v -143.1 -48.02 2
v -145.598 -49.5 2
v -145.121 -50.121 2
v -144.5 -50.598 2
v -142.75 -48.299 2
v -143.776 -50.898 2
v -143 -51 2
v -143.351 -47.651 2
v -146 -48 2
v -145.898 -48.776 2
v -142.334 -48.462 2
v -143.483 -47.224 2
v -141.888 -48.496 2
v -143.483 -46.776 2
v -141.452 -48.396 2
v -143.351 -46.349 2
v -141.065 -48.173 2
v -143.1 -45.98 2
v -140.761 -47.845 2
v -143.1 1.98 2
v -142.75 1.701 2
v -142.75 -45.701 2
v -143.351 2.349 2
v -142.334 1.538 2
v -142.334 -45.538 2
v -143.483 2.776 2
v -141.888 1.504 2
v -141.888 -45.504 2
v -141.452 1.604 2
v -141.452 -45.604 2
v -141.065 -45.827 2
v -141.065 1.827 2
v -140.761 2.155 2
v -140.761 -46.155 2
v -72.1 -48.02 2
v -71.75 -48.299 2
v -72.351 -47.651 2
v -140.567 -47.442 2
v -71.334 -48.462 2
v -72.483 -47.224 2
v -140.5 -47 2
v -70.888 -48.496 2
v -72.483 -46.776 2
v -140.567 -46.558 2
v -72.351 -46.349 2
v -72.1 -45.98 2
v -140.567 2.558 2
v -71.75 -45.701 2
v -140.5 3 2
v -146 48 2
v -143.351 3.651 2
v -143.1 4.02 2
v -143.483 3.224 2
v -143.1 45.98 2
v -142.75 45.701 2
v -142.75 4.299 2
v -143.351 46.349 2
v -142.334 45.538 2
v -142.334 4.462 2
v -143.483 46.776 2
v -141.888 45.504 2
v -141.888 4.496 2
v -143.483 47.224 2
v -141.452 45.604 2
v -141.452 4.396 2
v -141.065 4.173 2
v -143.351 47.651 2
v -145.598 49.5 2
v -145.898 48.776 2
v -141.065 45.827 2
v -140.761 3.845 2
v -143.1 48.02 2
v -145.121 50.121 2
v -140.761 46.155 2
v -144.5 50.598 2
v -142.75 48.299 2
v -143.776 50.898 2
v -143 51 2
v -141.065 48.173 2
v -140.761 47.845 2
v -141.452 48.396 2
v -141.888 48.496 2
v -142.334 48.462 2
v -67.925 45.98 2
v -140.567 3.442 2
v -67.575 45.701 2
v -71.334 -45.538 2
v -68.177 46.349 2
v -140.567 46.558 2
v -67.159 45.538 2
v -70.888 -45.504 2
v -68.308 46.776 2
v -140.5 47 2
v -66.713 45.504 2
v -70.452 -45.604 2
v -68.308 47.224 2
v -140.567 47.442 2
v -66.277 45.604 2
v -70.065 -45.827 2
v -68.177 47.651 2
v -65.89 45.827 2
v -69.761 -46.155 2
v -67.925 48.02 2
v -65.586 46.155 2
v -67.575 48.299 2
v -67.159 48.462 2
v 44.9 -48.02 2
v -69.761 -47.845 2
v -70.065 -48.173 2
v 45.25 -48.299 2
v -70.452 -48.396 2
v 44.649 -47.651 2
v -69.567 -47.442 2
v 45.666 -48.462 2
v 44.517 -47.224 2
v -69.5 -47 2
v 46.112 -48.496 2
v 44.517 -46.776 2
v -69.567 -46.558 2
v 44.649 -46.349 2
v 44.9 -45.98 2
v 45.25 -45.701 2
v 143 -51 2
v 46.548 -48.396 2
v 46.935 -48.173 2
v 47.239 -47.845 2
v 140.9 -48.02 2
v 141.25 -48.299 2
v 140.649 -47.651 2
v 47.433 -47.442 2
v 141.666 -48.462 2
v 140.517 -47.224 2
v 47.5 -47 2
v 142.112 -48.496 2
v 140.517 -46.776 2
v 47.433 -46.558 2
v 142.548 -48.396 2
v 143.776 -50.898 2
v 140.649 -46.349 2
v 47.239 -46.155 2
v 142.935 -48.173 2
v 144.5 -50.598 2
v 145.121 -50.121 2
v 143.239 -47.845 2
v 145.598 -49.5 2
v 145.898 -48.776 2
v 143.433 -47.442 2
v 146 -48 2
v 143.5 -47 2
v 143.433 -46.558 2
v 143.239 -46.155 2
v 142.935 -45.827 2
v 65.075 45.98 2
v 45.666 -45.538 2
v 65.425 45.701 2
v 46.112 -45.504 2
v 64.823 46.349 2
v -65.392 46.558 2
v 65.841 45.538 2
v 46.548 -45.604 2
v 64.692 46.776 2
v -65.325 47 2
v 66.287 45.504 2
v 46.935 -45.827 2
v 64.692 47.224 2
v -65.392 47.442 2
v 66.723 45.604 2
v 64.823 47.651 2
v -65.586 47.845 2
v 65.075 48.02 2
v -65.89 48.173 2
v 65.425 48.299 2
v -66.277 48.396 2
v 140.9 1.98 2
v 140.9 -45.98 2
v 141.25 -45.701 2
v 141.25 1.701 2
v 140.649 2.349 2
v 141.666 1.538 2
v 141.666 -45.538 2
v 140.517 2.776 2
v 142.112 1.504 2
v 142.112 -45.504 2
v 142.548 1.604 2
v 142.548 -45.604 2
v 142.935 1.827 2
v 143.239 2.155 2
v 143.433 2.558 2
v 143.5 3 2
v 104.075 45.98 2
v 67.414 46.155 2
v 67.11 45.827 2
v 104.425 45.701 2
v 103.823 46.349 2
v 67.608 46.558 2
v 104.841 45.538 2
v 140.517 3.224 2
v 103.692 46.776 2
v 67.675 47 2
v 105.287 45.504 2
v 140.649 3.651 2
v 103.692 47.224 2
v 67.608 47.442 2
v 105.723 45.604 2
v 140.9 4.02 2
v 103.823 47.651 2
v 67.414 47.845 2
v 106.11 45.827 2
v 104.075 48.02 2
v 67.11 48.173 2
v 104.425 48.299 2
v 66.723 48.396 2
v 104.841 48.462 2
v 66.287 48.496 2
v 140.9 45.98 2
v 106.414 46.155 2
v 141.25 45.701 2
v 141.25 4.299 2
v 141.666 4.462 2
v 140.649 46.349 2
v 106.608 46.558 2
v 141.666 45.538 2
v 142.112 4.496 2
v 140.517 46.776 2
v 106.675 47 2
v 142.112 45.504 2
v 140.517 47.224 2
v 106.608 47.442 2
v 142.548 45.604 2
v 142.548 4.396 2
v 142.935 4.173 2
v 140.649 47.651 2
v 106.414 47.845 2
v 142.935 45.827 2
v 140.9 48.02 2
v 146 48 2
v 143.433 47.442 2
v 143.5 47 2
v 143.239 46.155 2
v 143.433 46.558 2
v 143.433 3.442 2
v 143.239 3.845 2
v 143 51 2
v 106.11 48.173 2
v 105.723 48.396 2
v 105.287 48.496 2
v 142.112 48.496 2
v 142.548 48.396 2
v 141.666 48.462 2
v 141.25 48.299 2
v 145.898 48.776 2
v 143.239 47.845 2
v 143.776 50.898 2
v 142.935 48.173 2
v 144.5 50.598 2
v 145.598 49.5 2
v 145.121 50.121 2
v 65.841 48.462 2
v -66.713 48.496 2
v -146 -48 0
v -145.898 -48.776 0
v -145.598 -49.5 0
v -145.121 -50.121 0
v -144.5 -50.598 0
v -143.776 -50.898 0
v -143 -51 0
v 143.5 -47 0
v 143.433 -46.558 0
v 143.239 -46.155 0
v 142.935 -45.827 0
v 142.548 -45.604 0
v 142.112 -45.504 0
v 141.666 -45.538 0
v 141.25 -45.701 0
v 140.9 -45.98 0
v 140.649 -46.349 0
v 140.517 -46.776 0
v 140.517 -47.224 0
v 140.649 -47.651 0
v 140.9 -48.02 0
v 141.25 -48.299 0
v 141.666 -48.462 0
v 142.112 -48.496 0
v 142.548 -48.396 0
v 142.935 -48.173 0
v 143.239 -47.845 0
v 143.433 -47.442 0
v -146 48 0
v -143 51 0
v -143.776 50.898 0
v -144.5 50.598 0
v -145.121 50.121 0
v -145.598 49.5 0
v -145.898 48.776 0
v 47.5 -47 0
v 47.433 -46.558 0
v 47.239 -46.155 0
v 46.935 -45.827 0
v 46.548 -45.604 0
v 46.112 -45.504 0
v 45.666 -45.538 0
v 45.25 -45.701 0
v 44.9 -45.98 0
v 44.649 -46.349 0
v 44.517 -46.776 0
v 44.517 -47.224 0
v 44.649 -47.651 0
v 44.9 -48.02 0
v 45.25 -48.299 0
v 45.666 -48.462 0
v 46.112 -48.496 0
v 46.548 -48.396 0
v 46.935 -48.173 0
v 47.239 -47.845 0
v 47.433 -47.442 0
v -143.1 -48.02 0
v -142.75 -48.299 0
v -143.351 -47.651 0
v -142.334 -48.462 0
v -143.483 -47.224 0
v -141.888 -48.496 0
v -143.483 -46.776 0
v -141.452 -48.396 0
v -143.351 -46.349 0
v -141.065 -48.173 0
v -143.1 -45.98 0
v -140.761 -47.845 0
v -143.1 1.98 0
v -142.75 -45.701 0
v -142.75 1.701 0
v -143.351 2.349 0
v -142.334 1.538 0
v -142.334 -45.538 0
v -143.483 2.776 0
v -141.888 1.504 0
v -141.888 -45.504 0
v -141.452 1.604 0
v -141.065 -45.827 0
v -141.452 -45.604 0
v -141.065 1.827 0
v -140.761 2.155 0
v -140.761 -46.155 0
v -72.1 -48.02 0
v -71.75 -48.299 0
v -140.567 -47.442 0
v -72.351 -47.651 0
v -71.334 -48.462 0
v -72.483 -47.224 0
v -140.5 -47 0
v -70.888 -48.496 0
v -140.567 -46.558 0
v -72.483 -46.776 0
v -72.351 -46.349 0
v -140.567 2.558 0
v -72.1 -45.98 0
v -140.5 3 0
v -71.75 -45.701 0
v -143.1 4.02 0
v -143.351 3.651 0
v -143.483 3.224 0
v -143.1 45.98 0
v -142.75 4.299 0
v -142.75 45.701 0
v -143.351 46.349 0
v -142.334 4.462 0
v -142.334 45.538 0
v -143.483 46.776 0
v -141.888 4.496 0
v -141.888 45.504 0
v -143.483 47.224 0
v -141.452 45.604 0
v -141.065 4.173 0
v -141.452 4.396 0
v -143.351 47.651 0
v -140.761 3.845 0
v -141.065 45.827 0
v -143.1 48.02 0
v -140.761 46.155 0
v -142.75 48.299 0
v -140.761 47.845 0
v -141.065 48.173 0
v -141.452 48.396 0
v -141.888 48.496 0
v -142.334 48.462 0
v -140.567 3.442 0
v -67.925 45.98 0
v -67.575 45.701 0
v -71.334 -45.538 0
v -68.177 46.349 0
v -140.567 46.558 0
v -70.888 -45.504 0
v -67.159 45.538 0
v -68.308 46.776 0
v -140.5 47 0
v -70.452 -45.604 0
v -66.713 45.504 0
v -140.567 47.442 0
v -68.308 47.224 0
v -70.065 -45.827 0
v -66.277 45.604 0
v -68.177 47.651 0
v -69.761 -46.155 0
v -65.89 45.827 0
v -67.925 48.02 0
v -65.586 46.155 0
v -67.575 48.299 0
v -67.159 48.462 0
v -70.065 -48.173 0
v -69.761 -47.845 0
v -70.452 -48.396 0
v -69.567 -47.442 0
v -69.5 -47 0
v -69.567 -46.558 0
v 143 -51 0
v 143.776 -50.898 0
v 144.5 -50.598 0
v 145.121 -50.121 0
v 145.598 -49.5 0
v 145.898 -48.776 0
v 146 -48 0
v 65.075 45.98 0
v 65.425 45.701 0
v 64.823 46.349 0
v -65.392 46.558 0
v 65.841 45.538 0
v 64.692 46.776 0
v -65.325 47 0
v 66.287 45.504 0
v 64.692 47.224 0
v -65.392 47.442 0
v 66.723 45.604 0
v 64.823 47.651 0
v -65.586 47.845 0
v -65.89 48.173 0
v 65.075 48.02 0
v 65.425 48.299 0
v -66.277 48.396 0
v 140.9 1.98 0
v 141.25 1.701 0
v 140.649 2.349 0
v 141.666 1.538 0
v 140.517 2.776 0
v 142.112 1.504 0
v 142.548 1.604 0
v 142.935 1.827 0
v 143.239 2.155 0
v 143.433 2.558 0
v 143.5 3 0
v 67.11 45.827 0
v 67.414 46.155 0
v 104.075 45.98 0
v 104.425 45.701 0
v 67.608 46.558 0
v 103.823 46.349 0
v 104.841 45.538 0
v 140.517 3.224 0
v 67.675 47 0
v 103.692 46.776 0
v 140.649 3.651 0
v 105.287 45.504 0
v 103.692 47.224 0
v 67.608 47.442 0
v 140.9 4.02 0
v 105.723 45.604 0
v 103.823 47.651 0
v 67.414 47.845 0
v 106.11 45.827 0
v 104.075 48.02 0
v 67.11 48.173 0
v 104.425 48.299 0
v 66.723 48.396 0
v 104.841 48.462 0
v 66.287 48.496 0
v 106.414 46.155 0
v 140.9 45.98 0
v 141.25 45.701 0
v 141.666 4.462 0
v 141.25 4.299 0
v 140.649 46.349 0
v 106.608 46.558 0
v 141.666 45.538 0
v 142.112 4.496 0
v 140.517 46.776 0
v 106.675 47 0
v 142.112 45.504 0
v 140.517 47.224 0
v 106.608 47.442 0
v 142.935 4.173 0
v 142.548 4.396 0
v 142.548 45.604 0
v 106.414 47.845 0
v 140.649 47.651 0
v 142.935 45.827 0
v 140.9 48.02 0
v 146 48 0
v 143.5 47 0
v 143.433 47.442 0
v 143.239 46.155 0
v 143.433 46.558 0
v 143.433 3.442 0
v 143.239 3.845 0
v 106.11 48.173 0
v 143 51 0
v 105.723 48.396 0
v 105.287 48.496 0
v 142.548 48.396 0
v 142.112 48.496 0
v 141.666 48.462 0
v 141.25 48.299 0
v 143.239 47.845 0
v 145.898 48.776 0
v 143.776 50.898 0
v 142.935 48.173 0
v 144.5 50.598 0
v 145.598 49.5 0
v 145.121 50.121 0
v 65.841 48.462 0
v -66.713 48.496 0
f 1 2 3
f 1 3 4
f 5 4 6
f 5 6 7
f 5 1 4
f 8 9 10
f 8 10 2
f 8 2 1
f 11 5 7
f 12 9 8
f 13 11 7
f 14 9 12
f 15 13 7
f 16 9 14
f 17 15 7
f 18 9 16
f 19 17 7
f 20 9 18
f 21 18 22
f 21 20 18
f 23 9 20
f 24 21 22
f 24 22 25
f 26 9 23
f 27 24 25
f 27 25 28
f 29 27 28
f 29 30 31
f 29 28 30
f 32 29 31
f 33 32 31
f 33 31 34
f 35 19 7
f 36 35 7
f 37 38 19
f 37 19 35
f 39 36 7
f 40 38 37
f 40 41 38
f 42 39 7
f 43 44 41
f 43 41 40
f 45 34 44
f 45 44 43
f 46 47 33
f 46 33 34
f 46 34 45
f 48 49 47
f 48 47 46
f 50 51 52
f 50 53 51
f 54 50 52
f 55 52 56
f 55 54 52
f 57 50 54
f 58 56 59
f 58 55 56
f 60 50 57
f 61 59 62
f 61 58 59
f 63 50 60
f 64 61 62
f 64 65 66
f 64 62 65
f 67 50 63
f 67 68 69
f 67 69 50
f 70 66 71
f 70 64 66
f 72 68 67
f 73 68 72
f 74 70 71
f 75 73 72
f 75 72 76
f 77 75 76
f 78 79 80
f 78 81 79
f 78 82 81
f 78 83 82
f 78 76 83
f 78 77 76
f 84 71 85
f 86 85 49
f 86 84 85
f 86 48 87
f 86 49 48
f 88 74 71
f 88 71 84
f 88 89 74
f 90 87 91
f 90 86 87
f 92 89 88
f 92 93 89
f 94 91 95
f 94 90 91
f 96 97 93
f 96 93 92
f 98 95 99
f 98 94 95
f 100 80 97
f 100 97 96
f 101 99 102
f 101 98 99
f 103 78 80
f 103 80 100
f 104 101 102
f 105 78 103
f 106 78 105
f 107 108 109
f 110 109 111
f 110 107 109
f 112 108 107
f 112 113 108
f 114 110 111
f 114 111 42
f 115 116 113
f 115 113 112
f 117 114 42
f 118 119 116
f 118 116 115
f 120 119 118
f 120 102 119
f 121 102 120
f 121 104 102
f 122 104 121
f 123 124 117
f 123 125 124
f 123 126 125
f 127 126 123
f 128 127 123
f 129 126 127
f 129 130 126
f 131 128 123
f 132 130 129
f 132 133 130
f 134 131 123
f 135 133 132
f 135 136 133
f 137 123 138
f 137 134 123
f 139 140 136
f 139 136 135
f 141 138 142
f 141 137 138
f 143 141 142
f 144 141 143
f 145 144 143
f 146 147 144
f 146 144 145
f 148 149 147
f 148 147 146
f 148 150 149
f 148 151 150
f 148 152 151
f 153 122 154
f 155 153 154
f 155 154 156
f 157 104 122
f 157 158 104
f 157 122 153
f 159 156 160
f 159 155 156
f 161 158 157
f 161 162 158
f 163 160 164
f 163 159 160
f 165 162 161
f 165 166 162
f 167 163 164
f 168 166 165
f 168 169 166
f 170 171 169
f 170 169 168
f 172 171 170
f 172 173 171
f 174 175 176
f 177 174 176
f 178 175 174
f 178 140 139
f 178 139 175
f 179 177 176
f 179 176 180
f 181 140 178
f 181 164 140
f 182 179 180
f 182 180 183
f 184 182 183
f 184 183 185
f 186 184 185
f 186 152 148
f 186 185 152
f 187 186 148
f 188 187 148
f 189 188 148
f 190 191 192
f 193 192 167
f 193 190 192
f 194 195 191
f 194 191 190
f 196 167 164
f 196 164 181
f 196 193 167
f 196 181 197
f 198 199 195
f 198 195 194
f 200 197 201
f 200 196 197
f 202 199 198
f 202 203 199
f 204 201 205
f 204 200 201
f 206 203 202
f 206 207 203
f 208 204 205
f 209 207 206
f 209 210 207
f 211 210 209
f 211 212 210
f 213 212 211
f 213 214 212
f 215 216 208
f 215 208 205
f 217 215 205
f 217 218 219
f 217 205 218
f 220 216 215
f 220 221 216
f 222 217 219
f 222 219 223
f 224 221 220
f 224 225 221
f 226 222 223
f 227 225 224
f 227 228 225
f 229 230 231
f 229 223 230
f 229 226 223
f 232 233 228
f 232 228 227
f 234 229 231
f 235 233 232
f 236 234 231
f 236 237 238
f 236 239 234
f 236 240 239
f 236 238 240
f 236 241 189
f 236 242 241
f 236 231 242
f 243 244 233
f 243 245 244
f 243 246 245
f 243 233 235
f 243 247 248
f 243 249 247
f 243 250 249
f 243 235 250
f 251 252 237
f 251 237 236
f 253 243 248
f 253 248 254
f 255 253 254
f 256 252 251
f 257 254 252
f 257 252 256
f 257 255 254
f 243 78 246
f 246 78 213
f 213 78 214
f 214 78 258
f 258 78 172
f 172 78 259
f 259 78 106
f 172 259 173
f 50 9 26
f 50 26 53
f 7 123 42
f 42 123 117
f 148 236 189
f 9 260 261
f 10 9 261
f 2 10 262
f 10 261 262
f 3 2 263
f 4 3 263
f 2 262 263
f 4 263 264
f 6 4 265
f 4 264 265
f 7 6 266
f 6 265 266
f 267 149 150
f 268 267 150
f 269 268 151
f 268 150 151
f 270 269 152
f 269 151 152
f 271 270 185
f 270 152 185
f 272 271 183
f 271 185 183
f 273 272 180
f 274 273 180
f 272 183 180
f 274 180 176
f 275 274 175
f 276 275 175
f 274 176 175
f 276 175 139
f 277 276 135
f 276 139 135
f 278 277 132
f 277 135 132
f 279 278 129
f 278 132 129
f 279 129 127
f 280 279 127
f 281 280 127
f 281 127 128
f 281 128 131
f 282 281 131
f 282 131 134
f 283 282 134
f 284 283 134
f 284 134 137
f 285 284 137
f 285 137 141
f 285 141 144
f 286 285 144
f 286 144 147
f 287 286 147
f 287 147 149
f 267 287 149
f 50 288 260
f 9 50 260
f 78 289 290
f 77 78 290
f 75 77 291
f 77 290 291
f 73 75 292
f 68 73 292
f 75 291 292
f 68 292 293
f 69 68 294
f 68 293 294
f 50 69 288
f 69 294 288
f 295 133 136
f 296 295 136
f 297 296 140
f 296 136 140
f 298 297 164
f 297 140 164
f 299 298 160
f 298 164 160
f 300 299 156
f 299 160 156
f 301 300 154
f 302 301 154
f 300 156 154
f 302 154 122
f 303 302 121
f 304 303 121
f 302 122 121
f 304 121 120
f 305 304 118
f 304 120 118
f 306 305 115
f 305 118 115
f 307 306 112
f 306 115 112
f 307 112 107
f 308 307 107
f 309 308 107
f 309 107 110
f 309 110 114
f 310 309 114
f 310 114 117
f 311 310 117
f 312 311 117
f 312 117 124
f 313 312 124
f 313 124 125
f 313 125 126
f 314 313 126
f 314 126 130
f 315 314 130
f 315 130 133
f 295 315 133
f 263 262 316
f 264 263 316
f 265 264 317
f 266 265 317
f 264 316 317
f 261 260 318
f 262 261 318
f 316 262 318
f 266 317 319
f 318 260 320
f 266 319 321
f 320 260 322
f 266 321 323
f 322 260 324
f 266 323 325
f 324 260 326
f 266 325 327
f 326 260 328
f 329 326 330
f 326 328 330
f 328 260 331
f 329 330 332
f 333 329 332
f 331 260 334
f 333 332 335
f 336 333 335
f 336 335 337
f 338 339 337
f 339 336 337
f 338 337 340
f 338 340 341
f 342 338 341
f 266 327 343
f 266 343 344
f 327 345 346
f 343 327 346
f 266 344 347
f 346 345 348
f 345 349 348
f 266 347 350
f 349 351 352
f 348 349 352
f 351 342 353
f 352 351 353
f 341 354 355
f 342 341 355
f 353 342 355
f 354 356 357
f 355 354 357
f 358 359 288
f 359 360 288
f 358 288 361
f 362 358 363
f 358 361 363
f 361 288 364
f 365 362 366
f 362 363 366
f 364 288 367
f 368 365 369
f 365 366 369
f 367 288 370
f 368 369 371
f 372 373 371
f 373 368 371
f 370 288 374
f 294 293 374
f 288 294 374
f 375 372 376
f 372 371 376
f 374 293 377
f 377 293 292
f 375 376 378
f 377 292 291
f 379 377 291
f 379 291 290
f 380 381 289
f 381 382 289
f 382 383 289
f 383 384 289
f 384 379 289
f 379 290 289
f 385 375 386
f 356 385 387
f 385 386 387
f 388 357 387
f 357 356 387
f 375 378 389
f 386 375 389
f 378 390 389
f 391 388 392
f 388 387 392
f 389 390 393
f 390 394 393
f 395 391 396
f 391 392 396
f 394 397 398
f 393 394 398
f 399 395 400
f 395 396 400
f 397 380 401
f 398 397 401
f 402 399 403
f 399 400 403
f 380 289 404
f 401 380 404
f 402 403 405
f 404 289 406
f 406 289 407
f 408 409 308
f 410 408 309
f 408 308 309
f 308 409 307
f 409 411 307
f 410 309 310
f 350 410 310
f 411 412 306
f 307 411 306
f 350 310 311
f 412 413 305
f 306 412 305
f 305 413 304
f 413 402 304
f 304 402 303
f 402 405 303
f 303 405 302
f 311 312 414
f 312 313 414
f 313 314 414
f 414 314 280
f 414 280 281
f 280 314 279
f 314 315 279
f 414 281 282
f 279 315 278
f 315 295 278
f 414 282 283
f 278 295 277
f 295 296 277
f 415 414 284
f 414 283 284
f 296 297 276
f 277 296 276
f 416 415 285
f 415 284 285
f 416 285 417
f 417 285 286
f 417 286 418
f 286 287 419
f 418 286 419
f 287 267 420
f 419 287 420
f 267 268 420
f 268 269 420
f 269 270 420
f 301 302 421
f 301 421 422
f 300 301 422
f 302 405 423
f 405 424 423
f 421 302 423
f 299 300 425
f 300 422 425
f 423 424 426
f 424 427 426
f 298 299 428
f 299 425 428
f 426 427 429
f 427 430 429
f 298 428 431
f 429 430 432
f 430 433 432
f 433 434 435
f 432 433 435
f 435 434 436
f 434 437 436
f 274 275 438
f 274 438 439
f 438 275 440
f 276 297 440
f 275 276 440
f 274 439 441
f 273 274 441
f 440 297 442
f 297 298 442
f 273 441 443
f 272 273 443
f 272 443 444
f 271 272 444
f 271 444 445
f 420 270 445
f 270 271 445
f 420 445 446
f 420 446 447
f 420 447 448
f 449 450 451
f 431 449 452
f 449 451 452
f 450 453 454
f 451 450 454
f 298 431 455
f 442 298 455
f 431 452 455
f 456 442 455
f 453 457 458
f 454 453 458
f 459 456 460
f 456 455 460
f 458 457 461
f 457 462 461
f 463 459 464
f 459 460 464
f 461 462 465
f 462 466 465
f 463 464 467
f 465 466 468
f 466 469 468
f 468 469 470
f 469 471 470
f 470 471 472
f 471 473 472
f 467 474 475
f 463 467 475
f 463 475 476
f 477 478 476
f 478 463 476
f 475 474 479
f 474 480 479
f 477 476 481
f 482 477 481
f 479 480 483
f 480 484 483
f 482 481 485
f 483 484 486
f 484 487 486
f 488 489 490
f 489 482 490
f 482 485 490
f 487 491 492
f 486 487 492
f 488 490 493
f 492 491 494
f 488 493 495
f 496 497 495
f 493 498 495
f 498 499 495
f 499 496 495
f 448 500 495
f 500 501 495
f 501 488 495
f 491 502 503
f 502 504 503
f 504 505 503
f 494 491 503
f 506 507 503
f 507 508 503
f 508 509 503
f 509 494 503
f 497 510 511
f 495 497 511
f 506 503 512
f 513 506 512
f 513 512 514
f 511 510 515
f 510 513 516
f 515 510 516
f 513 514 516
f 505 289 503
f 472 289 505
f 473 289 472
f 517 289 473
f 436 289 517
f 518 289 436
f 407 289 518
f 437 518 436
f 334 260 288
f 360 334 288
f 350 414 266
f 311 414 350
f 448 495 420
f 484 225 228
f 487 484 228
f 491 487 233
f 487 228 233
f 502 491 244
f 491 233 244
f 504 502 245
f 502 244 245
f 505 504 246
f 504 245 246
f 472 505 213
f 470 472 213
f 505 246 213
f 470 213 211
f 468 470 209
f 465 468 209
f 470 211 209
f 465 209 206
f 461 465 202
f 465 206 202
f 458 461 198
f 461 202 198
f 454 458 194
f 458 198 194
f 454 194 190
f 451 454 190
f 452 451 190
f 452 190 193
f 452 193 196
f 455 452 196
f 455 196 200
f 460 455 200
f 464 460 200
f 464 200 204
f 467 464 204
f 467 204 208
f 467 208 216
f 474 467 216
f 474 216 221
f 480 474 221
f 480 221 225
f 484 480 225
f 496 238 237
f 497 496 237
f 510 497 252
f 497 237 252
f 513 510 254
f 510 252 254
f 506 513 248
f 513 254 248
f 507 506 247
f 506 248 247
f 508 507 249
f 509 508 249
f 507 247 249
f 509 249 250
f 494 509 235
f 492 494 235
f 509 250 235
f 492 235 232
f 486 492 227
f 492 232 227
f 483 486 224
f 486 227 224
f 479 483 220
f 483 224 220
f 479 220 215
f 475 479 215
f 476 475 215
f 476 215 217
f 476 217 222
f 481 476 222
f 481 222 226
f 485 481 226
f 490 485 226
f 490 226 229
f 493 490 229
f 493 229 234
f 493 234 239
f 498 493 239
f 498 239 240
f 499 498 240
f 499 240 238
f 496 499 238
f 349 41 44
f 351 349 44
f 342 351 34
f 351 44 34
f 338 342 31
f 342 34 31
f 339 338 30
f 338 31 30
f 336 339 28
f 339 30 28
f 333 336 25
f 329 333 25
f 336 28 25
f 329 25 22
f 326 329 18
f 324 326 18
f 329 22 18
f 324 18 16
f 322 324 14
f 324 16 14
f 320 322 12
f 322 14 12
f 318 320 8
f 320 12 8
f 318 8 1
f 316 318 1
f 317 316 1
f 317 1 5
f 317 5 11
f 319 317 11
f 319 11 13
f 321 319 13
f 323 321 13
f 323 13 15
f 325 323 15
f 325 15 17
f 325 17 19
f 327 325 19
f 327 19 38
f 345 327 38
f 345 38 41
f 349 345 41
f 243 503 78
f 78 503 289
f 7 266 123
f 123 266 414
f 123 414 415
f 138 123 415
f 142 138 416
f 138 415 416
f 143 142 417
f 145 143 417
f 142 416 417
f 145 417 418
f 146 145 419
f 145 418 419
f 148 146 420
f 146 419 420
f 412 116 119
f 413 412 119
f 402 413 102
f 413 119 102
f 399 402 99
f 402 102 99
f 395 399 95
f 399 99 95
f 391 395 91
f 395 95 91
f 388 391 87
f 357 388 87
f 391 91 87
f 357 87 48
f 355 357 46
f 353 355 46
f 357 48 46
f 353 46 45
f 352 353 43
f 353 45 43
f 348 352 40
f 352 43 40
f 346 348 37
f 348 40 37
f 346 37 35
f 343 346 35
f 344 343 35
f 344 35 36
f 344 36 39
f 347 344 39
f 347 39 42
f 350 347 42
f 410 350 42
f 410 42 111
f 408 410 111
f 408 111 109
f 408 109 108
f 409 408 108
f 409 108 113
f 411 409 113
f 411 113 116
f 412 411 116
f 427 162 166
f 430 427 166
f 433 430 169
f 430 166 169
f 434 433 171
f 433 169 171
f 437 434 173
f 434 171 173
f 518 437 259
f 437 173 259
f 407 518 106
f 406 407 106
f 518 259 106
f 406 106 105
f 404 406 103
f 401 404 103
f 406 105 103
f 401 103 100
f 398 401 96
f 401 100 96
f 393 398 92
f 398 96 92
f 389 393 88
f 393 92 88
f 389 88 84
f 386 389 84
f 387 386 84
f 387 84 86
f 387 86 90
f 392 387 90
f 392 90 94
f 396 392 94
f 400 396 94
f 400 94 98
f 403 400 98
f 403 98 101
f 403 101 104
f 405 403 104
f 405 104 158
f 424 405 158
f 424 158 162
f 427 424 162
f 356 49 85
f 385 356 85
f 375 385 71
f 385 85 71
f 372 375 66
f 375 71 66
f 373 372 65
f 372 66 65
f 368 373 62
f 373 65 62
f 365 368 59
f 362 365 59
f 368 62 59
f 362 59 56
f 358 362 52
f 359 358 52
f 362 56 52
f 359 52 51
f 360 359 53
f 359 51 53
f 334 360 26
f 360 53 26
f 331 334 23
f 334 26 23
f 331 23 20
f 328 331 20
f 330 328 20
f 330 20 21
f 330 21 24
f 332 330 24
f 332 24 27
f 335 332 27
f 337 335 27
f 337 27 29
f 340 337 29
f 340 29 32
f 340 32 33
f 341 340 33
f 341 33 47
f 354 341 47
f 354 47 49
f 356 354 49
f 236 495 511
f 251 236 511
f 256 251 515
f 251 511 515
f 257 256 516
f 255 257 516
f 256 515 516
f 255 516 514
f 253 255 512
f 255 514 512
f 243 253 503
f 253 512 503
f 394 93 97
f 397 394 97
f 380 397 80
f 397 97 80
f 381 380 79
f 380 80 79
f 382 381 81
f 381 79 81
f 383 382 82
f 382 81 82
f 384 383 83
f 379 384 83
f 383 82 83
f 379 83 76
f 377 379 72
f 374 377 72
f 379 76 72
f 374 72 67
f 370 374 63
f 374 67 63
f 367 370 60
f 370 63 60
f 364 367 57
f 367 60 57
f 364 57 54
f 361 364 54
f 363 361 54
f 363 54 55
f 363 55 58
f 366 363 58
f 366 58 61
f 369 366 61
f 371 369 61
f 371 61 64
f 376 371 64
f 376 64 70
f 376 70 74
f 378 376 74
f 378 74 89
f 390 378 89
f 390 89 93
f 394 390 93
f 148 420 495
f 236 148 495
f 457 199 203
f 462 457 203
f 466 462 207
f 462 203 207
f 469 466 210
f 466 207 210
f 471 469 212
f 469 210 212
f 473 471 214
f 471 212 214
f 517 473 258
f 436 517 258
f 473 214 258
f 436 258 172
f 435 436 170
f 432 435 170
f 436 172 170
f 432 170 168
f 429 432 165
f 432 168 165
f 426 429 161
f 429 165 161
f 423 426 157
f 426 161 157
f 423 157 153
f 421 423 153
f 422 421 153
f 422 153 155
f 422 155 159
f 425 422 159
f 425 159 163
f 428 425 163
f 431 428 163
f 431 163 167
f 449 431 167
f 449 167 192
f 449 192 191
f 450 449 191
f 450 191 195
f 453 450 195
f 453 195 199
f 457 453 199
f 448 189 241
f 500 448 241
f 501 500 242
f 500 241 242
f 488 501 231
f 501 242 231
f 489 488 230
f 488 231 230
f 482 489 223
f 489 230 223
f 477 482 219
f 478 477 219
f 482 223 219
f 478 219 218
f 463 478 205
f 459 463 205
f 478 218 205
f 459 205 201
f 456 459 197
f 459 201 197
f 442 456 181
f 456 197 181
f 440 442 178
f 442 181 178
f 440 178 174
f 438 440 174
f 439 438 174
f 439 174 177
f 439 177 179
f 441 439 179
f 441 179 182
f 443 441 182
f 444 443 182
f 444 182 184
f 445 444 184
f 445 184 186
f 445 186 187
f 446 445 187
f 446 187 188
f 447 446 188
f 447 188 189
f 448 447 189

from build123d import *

# Parameters (mm, degrees)
F1_DEPTH = 2
F2_R     = 1.5
F3_DEPTH = 2.001


with BuildPart() as f1:
    # F0 (on Top) → F1 (new body)
    with BuildSketch(Plane.XY):
        with BuildLine():
            ThreePointArc((146, 48), (145.12132, 50.12132), (143, 51))
            Line((143, 51), (-143, 51))
            ThreePointArc((-143, 51), (-145.12132, 50.12132), (-146, 48))
            Line((-146, 48), (-146, -48))
            ThreePointArc((-146, -48), (-145.12132, -50.12132), (-143, -51))
            Line((-143, -51), (143, -51))
            ThreePointArc((143, -51), (145.12132, -50.12132), (146, -48))
            Line((146, -48), (146, 48))
        make_face()
    extrude(amount=F1_DEPTH)

    # F2 (on face) → F3 (cut, through all)
    with BuildSketch(Plane.XY.offset(2)):
        with Locations((-142, 47)):
            Circle(F2_R)
        with Locations((142, 47)):
            Circle(F2_R)
        with Locations((-66.825193, 47)):
            Circle(F2_R)
        with Locations((66.174807, 47)):
            Circle(F2_R)
        with Locations((-142, -47)):
            Circle(F2_R)
        with Locations((142, -47)):
            Circle(F2_R)
        with Locations((-71, -47)):
            Circle(F2_R)
        with Locations((46, -47)):
            Circle(F2_R)
        with Locations((142, 3)):
            Circle(F2_R)
        with Locations((-142, 3)):
            Circle(F2_R)
        with Locations((105.174807, 47)):
            Circle(F2_R)
    extrude(amount=-F3_DEPTH, mode=Mode.SUBTRACT)


solid = f1.part
